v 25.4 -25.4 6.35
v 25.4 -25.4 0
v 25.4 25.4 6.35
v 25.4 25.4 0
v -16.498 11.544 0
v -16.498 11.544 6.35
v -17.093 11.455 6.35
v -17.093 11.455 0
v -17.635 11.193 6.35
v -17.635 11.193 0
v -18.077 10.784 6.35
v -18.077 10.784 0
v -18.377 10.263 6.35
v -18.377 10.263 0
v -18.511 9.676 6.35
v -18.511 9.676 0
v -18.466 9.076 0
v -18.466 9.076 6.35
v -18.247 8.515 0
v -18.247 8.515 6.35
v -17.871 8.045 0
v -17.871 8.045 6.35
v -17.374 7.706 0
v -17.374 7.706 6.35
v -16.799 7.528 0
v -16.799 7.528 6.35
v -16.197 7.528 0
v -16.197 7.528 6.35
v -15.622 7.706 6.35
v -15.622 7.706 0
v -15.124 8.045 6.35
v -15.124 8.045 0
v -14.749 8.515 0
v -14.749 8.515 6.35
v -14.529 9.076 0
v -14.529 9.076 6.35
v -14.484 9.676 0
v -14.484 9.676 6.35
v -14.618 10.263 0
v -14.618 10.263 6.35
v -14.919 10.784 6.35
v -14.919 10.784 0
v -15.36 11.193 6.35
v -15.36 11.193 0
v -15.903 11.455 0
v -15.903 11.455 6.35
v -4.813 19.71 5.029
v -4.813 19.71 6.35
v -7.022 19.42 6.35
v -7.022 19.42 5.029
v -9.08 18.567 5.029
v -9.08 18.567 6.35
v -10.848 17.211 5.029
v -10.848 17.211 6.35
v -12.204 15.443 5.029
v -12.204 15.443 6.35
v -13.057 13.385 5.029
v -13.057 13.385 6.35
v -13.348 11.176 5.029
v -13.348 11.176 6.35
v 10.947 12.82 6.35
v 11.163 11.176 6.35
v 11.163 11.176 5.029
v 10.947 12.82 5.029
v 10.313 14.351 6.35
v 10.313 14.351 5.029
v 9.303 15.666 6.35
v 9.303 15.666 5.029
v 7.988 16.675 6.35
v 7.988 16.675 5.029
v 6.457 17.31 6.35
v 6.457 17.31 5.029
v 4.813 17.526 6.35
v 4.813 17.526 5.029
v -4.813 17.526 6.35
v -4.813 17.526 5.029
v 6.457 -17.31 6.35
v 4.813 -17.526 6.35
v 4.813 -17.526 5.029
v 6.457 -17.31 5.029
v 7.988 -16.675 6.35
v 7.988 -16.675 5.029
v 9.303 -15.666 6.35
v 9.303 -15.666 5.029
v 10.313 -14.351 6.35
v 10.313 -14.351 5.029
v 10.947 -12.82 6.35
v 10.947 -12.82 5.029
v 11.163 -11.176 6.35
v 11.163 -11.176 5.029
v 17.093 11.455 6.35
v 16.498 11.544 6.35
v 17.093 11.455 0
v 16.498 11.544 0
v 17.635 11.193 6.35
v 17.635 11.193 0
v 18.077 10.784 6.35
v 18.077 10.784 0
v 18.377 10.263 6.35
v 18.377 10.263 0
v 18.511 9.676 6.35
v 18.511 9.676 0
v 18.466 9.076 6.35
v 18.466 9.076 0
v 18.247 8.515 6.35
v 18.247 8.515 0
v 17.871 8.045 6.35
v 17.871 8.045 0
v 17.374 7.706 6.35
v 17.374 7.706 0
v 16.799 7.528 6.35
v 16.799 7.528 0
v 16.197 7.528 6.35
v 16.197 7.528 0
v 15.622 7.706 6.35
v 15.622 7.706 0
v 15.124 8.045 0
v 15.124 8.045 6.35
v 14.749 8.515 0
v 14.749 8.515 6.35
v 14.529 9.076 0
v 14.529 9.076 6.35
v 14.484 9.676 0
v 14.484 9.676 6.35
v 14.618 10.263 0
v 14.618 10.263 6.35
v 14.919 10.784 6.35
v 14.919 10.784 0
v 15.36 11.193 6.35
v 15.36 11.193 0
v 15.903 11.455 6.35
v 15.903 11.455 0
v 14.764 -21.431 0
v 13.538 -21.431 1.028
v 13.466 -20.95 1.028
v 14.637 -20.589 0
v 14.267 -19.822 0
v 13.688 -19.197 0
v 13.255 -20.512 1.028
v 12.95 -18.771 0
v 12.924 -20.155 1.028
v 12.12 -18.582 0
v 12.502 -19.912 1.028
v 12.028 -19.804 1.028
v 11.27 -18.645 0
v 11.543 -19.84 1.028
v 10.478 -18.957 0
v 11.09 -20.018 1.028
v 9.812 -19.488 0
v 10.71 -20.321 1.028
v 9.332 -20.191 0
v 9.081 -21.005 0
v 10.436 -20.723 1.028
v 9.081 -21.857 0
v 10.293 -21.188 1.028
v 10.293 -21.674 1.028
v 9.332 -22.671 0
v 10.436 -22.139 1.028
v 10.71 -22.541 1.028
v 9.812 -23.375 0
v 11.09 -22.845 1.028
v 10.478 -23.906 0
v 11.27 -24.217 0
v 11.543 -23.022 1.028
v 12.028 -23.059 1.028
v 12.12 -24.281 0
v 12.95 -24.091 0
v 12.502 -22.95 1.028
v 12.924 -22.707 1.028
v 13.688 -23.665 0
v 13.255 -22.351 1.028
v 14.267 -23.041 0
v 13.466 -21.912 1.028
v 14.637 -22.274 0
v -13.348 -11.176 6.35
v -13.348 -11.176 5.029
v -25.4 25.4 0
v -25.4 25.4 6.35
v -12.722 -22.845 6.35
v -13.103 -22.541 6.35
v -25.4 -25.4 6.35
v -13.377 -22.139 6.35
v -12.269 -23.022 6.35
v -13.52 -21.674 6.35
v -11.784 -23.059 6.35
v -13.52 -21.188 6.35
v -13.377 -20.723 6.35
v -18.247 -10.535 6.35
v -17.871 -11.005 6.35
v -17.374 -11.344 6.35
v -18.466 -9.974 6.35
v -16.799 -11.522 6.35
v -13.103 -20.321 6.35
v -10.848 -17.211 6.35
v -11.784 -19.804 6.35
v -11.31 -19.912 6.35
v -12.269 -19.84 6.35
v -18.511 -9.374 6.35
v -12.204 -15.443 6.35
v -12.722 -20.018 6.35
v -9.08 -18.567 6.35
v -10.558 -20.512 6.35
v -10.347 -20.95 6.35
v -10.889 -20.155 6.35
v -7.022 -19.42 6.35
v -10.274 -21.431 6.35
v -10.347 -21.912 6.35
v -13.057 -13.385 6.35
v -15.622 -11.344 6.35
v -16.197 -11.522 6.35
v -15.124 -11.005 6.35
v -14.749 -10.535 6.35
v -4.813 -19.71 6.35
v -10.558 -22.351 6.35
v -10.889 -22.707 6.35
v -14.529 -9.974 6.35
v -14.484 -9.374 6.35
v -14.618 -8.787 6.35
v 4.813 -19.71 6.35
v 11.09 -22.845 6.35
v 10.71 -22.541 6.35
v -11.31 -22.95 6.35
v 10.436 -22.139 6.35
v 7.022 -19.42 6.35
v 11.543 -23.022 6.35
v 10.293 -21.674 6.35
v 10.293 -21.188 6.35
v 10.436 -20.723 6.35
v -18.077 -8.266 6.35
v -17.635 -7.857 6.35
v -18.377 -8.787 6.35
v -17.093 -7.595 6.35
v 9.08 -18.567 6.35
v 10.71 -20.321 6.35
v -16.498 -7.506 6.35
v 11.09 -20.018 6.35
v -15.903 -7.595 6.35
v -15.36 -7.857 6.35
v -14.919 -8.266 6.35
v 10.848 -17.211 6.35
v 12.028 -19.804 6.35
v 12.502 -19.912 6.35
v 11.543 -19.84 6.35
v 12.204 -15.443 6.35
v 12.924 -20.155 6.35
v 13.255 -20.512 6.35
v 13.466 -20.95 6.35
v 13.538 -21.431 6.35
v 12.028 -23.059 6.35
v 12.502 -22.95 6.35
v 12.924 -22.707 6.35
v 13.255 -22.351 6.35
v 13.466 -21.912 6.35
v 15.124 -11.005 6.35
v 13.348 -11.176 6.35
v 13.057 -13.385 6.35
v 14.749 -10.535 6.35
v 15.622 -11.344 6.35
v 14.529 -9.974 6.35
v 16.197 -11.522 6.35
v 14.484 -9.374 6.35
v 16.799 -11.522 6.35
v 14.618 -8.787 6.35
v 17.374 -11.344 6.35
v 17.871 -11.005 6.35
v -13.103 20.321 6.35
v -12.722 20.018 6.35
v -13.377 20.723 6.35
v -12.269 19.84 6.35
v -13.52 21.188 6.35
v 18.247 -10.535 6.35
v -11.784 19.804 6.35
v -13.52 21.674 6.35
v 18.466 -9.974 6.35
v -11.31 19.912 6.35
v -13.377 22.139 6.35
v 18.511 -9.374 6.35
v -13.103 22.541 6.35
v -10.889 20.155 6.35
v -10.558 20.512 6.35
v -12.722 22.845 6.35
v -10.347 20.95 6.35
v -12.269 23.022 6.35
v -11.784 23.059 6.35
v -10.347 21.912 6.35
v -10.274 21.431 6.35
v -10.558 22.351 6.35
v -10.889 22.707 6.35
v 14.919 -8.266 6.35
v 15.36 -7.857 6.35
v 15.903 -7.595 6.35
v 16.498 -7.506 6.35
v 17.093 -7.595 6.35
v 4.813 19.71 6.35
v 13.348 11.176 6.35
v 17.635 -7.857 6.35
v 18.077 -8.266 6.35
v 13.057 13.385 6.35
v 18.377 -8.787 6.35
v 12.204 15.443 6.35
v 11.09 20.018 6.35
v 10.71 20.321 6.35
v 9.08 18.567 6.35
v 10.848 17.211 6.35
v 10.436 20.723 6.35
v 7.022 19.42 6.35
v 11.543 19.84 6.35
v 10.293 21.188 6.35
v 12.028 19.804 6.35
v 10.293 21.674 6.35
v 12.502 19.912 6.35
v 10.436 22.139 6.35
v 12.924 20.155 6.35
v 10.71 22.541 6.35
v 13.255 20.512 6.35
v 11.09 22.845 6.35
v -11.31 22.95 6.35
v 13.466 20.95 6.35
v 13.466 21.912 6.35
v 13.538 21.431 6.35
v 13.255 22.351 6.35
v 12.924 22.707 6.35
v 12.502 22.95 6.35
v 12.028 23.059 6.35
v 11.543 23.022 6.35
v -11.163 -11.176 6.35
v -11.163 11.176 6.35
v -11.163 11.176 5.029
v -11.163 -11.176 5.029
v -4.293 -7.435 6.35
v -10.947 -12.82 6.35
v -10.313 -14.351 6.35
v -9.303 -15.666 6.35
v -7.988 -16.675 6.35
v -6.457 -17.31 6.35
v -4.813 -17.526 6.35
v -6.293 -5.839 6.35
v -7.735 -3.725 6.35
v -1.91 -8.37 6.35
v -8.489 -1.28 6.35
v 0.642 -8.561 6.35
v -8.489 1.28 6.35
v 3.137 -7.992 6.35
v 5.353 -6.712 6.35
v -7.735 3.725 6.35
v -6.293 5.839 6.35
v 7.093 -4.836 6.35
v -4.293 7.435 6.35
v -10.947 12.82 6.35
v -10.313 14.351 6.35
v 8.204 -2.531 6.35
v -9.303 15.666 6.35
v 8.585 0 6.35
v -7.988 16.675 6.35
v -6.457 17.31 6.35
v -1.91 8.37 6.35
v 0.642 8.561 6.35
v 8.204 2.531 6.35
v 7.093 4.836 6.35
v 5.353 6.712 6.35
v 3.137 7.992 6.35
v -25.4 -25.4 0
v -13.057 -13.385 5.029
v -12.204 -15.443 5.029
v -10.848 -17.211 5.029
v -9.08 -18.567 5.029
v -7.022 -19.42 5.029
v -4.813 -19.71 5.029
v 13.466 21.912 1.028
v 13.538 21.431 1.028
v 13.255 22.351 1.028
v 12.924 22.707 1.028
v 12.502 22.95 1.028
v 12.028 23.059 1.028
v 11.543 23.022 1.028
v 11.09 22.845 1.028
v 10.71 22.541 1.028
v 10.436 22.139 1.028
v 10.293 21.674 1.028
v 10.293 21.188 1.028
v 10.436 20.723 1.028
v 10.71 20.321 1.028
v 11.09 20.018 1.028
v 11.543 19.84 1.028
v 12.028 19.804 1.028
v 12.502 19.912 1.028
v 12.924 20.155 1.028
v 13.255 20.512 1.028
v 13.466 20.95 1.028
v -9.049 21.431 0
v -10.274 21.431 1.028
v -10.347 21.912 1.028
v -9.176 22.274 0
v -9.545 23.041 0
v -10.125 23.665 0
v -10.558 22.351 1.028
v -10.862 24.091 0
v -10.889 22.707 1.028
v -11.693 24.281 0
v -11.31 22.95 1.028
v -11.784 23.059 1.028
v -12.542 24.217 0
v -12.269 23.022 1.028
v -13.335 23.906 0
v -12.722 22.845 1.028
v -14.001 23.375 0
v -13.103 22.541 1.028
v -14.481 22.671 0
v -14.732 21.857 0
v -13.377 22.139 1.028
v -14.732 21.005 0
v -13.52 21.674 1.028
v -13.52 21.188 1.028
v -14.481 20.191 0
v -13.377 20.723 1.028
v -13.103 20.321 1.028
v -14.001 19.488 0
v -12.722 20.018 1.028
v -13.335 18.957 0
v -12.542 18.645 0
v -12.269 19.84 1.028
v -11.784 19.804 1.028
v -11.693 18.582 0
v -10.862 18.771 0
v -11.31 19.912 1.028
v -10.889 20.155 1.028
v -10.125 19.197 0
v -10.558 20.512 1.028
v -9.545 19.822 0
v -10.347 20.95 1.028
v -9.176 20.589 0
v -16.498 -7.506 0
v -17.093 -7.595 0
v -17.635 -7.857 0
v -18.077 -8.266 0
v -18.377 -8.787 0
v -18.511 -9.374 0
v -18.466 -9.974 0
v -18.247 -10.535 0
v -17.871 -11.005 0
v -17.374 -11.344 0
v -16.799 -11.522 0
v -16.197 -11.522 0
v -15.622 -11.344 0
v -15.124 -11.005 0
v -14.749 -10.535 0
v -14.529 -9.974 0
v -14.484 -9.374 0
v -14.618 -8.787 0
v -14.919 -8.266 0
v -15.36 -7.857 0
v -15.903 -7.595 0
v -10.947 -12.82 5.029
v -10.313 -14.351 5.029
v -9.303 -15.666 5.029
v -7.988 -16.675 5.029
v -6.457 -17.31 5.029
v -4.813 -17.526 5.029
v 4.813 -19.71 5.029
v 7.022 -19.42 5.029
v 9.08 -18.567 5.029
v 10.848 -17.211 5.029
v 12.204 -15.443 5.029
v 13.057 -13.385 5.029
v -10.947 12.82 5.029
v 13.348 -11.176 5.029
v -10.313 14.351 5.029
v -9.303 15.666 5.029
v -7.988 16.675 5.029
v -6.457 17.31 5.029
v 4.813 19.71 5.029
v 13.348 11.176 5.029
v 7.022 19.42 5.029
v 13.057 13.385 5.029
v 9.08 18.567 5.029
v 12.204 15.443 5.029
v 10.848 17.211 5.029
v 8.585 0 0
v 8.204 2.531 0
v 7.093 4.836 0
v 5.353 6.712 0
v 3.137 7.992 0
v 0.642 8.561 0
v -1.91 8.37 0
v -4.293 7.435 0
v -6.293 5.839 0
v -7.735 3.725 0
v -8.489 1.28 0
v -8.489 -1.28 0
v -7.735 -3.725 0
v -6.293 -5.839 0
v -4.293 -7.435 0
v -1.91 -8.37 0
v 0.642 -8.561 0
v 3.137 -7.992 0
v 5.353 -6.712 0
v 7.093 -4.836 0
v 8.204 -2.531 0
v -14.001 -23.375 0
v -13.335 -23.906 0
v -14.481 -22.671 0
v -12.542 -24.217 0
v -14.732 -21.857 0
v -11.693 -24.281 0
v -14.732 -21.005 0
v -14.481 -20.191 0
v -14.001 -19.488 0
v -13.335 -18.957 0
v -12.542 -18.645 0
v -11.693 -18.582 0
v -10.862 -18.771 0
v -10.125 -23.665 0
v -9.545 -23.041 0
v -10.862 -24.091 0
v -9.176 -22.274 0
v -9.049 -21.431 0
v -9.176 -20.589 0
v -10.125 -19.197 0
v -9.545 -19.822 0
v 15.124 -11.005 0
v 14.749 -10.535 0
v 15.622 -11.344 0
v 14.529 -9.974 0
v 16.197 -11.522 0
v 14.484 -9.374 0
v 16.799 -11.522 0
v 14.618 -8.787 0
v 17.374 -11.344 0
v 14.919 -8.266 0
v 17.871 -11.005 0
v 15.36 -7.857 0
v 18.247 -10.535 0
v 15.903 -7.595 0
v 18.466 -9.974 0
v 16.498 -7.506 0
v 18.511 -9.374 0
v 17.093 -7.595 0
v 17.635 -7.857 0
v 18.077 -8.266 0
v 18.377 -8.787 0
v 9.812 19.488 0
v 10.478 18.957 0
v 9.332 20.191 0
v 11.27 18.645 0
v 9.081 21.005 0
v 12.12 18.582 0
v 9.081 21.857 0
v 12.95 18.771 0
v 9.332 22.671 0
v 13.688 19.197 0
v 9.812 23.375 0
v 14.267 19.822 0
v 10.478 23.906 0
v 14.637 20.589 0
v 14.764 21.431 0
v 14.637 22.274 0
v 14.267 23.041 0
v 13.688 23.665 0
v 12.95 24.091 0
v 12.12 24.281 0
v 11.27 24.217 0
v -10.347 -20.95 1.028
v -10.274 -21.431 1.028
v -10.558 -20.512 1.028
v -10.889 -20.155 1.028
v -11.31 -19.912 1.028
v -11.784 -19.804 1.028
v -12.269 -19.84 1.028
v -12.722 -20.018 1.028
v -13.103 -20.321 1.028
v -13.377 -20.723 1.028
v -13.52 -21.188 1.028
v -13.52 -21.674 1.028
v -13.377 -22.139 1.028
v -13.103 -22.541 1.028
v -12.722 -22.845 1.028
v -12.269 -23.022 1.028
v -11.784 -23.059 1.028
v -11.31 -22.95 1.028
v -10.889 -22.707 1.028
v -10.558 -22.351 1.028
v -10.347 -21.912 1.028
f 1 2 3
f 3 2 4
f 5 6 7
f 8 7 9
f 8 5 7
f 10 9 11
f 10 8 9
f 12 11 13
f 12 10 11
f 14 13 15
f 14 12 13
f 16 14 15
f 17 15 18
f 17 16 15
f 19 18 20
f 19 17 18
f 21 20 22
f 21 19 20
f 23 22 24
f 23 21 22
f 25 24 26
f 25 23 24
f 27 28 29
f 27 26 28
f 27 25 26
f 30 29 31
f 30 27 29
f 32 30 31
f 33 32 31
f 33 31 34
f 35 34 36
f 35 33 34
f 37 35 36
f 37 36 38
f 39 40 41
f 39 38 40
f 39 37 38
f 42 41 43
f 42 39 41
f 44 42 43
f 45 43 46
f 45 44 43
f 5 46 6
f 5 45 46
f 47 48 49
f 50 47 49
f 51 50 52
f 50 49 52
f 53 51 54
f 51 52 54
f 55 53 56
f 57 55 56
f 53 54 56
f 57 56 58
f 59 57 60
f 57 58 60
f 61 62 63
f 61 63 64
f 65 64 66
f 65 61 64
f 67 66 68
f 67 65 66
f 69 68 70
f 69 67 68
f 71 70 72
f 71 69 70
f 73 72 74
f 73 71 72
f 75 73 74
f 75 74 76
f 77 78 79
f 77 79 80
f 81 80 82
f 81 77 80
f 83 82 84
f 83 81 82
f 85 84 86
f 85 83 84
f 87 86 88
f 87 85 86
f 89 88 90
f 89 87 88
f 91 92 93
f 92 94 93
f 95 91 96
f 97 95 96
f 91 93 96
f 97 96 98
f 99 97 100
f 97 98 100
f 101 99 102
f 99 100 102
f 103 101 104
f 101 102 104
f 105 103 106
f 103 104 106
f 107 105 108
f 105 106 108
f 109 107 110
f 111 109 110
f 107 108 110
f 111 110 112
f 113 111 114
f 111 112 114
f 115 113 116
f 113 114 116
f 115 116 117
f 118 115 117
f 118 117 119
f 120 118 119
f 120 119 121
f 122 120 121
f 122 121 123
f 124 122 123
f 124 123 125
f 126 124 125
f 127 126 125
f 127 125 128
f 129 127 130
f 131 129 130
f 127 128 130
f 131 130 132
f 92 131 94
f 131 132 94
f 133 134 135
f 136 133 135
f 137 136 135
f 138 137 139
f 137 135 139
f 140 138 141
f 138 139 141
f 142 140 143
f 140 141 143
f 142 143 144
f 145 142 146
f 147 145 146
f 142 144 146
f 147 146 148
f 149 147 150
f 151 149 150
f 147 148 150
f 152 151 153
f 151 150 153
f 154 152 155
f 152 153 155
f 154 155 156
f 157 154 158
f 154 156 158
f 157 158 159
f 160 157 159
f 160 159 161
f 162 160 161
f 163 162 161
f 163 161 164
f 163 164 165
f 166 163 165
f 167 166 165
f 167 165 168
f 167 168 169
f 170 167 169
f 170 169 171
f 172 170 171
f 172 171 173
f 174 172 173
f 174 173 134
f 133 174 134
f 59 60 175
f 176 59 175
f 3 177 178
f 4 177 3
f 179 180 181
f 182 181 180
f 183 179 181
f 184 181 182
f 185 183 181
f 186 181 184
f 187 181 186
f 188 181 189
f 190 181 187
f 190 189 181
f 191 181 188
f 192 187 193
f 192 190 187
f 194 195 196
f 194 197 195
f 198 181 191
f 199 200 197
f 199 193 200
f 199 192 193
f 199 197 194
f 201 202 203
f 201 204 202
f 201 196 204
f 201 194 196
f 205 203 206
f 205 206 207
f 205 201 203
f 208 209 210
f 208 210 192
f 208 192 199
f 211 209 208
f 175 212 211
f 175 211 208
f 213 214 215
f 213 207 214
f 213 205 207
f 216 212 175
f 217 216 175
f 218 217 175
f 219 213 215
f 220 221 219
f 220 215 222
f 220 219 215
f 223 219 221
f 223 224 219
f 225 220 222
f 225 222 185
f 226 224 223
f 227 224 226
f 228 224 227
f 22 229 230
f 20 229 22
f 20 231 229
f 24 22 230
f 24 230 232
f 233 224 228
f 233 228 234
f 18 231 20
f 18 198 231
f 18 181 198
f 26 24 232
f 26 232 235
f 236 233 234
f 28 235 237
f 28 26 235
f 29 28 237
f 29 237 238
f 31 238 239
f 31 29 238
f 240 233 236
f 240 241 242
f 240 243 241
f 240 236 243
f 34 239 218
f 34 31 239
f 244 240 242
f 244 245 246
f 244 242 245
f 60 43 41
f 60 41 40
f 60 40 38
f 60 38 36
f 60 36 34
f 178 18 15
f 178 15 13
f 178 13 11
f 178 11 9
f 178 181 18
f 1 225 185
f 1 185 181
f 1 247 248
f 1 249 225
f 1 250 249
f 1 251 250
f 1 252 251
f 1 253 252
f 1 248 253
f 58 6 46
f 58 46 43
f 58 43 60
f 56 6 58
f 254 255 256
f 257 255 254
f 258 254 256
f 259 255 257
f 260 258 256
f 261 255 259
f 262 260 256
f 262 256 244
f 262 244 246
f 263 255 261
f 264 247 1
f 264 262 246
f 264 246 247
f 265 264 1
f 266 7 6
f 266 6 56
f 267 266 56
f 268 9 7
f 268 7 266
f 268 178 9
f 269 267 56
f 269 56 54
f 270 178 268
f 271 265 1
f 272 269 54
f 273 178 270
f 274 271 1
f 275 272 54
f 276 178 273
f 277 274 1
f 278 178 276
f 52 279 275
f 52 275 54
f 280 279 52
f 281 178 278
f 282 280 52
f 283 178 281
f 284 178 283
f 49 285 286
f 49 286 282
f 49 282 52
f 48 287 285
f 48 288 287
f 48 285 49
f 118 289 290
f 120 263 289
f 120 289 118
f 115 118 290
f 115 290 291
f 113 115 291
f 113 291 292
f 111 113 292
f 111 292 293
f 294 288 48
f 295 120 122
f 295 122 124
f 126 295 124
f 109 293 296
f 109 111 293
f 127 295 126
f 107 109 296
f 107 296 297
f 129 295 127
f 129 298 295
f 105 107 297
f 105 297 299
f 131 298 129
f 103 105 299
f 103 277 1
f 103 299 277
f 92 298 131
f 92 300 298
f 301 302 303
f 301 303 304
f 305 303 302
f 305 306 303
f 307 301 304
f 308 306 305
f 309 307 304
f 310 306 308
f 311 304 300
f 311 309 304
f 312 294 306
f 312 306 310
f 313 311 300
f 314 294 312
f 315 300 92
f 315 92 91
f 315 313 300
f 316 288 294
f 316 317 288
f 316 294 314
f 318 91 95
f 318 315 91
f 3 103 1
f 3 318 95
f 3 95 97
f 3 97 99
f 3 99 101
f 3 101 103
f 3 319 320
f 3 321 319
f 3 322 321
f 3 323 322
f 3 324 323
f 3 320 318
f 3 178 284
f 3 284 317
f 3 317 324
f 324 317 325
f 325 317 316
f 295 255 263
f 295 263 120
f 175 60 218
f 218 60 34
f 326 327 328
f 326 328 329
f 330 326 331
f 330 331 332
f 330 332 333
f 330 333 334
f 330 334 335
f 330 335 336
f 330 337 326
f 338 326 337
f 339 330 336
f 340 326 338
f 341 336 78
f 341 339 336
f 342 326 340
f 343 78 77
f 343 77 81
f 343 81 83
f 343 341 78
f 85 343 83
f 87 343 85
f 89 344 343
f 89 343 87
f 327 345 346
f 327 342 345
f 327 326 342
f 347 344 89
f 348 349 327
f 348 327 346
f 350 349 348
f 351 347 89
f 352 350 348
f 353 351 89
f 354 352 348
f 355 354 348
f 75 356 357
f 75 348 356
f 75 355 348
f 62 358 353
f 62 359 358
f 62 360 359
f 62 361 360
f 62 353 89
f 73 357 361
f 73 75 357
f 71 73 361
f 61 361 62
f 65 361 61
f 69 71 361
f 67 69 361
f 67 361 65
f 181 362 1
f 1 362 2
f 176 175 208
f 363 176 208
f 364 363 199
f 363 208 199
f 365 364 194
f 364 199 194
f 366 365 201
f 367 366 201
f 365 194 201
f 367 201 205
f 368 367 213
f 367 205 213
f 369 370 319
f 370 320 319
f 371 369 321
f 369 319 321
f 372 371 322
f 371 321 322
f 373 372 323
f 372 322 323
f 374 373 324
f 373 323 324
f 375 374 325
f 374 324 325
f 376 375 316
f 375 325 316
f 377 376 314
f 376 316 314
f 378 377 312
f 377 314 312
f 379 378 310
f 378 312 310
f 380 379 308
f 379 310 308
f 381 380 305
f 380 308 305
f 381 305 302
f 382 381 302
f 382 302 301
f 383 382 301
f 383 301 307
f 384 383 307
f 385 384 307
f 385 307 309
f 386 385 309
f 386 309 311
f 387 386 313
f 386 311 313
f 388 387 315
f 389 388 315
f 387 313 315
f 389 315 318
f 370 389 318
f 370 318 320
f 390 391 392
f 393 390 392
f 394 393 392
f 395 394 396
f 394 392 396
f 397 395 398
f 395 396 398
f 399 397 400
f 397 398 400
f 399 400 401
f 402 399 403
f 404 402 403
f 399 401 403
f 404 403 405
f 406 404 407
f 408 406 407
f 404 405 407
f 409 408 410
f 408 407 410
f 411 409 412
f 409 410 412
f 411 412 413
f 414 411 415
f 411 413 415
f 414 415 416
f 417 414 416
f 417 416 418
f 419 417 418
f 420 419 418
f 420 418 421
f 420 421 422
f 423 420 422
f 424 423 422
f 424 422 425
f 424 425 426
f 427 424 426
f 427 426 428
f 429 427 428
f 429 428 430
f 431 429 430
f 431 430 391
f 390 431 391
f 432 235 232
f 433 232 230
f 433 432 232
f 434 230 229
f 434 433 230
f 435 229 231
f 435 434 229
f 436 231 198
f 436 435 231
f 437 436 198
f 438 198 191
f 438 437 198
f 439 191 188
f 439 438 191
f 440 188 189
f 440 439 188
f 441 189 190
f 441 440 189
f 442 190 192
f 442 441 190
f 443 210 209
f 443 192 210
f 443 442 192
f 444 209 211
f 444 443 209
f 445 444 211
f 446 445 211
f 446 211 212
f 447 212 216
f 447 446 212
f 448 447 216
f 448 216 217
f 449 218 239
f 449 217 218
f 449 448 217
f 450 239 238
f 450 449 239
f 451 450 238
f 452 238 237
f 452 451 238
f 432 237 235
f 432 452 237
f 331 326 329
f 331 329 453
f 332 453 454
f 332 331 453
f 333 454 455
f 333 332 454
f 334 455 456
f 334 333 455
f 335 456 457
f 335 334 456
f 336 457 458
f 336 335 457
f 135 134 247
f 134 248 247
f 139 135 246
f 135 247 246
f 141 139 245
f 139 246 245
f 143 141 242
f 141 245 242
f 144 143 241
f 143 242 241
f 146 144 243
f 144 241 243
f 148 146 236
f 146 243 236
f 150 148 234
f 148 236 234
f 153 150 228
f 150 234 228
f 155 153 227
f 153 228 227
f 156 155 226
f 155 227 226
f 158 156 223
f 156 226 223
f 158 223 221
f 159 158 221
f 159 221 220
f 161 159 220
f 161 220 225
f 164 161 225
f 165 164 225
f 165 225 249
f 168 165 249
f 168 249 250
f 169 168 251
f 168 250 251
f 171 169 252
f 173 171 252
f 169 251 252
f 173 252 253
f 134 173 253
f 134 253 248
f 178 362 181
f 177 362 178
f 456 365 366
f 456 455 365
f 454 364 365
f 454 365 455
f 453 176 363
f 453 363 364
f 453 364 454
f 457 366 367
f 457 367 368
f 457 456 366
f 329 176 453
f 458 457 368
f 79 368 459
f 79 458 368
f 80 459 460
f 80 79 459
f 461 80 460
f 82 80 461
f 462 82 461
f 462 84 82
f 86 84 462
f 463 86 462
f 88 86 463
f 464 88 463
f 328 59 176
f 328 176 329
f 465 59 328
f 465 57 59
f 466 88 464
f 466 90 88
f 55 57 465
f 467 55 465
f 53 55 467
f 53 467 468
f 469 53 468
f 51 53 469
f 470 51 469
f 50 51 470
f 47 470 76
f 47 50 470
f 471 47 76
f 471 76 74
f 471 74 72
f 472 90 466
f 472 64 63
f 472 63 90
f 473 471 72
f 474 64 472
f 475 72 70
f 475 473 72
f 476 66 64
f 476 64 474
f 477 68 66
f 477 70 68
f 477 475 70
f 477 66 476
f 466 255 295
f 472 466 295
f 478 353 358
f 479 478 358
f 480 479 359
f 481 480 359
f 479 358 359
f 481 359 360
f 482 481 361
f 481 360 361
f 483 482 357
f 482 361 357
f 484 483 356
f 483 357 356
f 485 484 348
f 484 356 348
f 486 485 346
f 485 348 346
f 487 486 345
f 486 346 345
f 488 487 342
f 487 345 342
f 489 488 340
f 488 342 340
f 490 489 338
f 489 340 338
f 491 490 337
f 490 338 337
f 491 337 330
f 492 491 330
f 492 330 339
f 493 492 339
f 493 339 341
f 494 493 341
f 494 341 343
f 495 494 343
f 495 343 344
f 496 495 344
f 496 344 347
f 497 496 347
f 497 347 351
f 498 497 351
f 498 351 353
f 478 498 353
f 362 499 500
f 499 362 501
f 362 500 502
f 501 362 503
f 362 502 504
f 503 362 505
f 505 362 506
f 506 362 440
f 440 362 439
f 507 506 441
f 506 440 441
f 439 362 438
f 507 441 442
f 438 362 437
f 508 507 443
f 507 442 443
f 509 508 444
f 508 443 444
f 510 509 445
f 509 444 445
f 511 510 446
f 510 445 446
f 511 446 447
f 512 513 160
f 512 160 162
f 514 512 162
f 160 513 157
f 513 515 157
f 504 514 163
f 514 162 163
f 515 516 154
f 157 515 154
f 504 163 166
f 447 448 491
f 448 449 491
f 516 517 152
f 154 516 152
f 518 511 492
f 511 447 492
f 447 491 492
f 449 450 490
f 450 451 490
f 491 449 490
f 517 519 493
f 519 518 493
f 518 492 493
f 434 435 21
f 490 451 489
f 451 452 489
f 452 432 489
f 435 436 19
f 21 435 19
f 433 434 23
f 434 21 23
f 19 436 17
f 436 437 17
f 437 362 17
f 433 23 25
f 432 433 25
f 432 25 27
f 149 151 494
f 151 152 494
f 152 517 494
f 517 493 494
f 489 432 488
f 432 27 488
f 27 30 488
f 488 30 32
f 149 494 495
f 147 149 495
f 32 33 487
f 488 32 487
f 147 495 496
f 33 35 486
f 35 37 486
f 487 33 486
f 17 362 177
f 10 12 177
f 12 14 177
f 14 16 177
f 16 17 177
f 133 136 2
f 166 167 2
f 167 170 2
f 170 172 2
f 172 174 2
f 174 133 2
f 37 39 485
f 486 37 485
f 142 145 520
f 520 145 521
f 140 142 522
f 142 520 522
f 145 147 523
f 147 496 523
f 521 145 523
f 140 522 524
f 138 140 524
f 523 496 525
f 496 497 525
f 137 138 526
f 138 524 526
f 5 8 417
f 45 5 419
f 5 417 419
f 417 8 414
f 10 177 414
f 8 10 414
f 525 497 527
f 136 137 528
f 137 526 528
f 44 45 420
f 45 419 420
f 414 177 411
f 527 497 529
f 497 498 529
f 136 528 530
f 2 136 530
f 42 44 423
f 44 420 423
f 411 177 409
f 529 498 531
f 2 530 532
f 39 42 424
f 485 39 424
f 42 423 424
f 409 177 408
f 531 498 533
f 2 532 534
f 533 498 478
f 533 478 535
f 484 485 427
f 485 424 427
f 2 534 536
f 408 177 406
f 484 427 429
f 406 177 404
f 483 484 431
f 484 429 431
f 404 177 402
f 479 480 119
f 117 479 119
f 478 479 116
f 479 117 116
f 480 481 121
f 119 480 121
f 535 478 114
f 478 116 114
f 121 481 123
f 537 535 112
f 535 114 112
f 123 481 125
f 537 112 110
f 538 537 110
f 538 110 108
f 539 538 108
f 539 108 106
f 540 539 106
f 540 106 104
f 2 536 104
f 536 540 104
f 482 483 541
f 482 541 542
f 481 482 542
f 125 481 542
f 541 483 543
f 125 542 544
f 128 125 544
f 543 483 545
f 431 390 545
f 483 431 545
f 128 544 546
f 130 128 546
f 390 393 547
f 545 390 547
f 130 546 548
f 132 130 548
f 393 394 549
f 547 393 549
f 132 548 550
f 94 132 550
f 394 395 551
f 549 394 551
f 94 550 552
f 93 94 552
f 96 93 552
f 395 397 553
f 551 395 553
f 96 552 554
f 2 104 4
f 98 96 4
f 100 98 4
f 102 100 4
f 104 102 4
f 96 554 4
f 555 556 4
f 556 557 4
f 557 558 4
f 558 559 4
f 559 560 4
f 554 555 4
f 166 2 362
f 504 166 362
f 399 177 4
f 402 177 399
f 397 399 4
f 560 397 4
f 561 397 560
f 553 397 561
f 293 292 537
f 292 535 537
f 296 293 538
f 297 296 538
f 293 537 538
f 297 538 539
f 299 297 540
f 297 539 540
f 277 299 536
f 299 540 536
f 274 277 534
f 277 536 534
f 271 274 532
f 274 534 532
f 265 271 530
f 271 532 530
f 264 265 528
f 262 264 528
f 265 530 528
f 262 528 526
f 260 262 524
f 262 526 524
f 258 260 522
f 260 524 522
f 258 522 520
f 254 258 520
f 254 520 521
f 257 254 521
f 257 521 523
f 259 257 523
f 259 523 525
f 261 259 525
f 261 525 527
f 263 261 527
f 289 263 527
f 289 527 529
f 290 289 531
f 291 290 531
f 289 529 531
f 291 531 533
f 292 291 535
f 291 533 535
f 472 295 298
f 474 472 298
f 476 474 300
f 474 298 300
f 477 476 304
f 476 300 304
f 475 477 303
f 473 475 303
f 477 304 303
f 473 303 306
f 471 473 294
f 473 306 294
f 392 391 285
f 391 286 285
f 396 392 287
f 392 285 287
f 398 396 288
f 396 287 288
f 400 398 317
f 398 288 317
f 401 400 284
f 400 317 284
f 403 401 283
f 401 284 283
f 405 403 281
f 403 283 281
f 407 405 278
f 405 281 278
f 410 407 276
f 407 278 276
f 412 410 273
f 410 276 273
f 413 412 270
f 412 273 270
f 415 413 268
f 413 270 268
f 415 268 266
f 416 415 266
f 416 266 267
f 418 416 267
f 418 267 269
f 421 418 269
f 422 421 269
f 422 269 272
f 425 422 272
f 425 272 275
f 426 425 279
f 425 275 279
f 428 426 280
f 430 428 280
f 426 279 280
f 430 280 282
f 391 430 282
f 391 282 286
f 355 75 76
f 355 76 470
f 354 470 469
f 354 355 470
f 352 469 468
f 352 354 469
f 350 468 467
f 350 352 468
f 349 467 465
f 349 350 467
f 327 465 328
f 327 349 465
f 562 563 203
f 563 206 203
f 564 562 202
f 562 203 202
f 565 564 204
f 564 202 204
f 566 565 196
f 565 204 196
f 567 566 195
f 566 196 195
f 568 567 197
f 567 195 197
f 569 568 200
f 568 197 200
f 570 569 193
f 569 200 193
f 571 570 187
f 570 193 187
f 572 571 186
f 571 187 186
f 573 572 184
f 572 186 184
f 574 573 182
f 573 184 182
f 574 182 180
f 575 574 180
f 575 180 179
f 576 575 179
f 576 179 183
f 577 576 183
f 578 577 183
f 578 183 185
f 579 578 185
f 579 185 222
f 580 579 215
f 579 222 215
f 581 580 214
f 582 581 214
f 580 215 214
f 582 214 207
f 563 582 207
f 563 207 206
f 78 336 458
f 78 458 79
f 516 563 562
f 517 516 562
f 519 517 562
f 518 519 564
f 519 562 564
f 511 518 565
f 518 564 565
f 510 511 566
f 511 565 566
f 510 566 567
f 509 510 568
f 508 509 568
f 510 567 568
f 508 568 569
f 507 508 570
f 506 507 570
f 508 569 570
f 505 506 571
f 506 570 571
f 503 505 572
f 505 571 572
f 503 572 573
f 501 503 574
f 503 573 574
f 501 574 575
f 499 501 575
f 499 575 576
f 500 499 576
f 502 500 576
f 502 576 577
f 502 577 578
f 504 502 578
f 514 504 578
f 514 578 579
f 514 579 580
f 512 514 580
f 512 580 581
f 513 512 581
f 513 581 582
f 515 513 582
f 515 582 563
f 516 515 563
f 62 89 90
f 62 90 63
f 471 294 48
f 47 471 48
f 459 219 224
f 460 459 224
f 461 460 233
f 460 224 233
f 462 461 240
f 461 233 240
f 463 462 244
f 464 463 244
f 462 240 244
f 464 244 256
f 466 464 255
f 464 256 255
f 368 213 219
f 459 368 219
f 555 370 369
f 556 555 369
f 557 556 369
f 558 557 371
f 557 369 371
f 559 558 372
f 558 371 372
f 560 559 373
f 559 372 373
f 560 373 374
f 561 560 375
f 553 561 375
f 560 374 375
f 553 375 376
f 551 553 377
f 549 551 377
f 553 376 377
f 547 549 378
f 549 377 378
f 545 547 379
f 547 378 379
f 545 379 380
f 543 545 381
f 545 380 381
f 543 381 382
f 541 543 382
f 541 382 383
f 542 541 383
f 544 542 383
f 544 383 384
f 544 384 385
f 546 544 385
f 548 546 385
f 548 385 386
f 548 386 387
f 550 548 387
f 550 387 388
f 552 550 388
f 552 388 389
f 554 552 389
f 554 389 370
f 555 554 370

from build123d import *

# Parameters (mm, degrees)
SKETCH1_W                                         = 50.8
SKETCH1_H                                         = 50.8
BOSS_EXTRUDE1_DEPTH                               = 6.35
SKETCH2_R                                         = 8.5852
CUT_EXTRUDE1_DEPTH                                = 7.35
CUT_EXTRUDE2_DASH_027_DEPTH                       = 1.3208
CSK_FOR_4_FLAT_HEAD_MACHINE_SCREW_100_D           = 3.2639
CSK_FOR_4_FLAT_HEAD_MACHINE_SCREW_100_CSINK_D     = 5.715
CSK_FOR_4_FLAT_HEAD_MACHINE_SCREW_100_CSINK_ANGLE = 100
F_10_32_TAPPED_HOLE1_AT_2_COUNT                   = 2
F_10_32_TAPPED_HOLE1_AT_2_PITCH                   = 19.05


with BuildPart() as part:
    # Sketch1 → Boss-Extrude1 (new body)
    with BuildSketch(Plane.XY):
        Rectangle(SKETCH1_W, SKETCH1_H)
    extrude(amount=BOSS_EXTRUDE1_DEPTH)

    # Sketch2 → Cut-Extrude1 (cut, through all)
    with BuildSketch(Plane.XY.offset(6.35)):
        Circle(SKETCH2_R)
    extrude(amount=-CUT_EXTRUDE1_DEPTH, mode=Mode.SUBTRACT)

    # Sketch3 → Cut-Extrude2 - dash 027 (cut)
    with BuildSketch(Plane.XY.offset(6.35)):
        with BuildLine():
            Line((13.3477, -11.176), (13.3477, 11.176))
            ThreePointArc((13.3477, 11.176), (10.848032113, 17.210732113), (4.8133, 19.7104))
            Line((4.8133, 19.7104), (-4.8133, 19.7104))
            ThreePointArc((-4.8133, 19.7104), (-10.848032113, 17.210732113), (-13.3477, 11.176))
            Line((-13.3477, 11.176), (-13.3477, -11.176))
            ThreePointArc((-13.3477, -11.176), (-10.848032113, -17.210732113), (-4.8133, -19.7104))
            Line((-4.8133, -19.7104), (4.8133, -19.7104))
            ThreePointArc((4.8133, -19.7104), (10.848032113, -17.210732113), (13.3477, -11.176))
        make_face()
        with BuildLine():
            Line((-4.8133, -17.526), (4.8133, -17.526))
            ThreePointArc((4.8133, -17.526), (9.303428061, -15.666128061), (11.1633, -11.176))
            Line((11.1633, -11.176), (11.1633, 11.176))
            ThreePointArc((11.1633, 11.176), (9.303428061, 15.666128061), (4.8133, 17.526))
            Line((4.8133, 17.526), (-4.8133, 17.526))
            ThreePointArc((-4.8133, 17.526), (-9.303428061, 15.666128061), (-11.1633, 11.176))
            Line((-11.1633, 11.176), (-11.1633, -11.176))
            ThreePointArc((-11.1633, -11.176), (-9.303428061, -15.666128061), (-4.8133, -17.526))
        make_face(mode=Mode.SUBTRACT)
    extrude(amount=-CUT_EXTRUDE2_DASH_027_DEPTH, mode=Mode.SUBTRACT)

    # CSK for #4 Flat Head Machine Screw (100)1 (through all)
    with Locations(Plane(origin=(0, 0, 0), x_dir=(-1, 0, 0), z_dir=(0, 0, -1))):
        with Locations((-11.90625, 21.43125), (11.90625, 21.43125), (-11.90625, -21.43125), (11.90625, -21.43125)):
            CounterSinkHole(CSK_FOR_4_FLAT_HEAD_MACHINE_SCREW_100_D / 2, CSK_FOR_4_FLAT_HEAD_MACHINE_SCREW_100_CSINK_D / 2, counter_sink_angle=CSK_FOR_4_FLAT_HEAD_MACHINE_SCREW_100_CSINK_ANGLE)

    # Sketch8 → #10-32 Tapped Hole1 (revolve, cut)
    with BuildSketch(Plane(origin=(-16.497783942, 9.525, 0), x_dir=(0, 1, 0), z_dir=(1, 0, 0))):
        Polygon((0, 0), (0, 14.929317848), (2.0193, 13.716), (2.0193, 0), align=None)
    f_10_32_tapped_hole1 = revolve(axis=Axis((-16.497783942, 9.525, -6.35), (0, 0, 1)), mode=Mode.SUBTRACT)

    # #10-32 Tapped Hole1 at 2: #10-32 Tapped Hole1 ×2
    with Locations(*[(0, -i * F_10_32_TAPPED_HOLE1_AT_2_PITCH, 0) for i in range(1, F_10_32_TAPPED_HOLE1_AT_2_COUNT)]):
        add(f_10_32_tapped_hole1, mode=Mode.SUBTRACT)

    # Mirror1: #10-32 Tapped Hole1 across plane
    add(f_10_32_tapped_hole1.mirror(Plane(origin=(0, 0, 0), x_dir=(0, 0, 1), z_dir=(1, 0, 0))), mode=Mode.SUBTRACT)

    # Mirror1 copy 1 sketch → Mirror1 copy 1 (revolve, cut)
    with BuildSketch(Plane(origin=(16.497783942, -9.525, 0), x_dir=(0, 1, 0), z_dir=(-1, 0, 0))):
        Polygon((0, 0), (0, -14.929317848), (2.0193, -13.716), (2.0193, 0), align=None)
    revolve(axis=Axis((16.497783942, -9.525, -6.35), (0, 0, -1)), mode=Mode.SUBTRACT)


solid = part.part
